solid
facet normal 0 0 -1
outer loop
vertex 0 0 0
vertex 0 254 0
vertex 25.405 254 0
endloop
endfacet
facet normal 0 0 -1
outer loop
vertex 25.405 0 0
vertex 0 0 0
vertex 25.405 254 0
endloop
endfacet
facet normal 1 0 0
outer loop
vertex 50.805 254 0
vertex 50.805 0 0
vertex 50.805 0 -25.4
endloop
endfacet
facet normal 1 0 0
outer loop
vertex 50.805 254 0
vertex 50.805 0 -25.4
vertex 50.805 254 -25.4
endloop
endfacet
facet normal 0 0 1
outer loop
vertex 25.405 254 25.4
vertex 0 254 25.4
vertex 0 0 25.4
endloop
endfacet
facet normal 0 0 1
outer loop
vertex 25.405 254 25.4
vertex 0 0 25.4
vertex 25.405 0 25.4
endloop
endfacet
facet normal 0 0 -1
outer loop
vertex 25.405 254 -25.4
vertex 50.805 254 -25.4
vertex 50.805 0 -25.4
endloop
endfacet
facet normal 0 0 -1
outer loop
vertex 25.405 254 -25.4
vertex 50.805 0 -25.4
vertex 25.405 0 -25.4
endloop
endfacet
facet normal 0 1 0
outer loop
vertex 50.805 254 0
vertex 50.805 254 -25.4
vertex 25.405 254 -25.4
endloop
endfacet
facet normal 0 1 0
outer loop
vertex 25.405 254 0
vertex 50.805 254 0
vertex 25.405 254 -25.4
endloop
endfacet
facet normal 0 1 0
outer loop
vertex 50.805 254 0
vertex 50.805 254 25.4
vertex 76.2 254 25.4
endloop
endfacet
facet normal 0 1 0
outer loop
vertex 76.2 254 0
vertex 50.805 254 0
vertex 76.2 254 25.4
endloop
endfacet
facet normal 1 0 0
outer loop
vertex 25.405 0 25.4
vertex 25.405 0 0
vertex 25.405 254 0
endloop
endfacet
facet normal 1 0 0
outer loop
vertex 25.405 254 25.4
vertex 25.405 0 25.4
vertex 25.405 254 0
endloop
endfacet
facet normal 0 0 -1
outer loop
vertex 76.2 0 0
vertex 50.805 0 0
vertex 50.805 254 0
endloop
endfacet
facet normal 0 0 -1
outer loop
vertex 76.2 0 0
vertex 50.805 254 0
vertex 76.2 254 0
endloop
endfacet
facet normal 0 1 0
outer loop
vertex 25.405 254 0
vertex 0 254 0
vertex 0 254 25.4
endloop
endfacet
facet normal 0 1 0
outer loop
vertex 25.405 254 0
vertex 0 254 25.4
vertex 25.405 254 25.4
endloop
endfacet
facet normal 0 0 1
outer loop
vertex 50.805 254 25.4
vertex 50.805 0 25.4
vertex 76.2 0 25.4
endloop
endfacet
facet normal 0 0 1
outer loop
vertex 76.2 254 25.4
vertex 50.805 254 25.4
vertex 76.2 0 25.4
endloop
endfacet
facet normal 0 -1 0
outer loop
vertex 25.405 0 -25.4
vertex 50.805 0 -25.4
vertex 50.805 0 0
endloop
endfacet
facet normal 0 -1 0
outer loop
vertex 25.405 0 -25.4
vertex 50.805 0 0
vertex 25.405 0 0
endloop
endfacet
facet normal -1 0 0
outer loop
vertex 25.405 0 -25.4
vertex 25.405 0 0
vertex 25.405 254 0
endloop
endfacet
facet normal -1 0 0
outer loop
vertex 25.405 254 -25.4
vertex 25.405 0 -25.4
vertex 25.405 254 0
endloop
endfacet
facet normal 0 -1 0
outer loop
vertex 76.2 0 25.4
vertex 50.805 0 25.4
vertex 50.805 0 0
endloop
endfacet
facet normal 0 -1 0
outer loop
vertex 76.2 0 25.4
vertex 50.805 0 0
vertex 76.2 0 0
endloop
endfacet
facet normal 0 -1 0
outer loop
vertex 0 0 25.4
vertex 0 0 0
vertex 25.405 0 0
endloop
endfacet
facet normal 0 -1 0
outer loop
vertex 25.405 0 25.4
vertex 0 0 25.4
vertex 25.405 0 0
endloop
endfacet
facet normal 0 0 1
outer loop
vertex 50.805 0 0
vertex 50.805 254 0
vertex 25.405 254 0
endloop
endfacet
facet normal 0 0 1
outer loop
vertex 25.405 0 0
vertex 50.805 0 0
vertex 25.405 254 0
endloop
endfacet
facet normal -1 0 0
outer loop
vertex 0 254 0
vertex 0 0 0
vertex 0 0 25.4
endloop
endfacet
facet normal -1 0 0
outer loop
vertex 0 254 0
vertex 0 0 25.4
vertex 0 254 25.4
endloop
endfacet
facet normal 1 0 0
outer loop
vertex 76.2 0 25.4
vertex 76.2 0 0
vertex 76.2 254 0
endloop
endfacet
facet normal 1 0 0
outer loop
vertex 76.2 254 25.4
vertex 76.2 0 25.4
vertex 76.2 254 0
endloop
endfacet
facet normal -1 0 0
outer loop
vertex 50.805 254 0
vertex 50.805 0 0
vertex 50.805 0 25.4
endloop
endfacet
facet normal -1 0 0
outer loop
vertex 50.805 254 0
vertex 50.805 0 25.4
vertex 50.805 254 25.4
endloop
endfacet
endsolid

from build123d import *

# Parameters (mm, degrees)
SKETCH1_W          = 25.395282645
SKETCH1_H          = 254
EXTRUSION2_DEPTH   = 25.4
SKETCH1_W_2        = 25.404717355
EXTRUSION2_2_DEPTH = 25.4
SKETCH2_W          = 25.4
SKETCH2_H          = 254
EXTRUSION3_DEPTH   = 25.4


with BuildPart() as part:
    # Sketch1 → Extrusion2 (new body)
    with BuildSketch(Plane.XY):
        with Locations((63.502358677, 127)):
            Rectangle(SKETCH1_W, SKETCH1_H)
    extrude(amount=EXTRUSION2_DEPTH)


with BuildPart() as body_2:
    # Sketch1 → Extrusion2 2 (new body)
    with BuildSketch(Plane.XY):
        with Locations((12.702358678, 127)):
            Rectangle(SKETCH1_W_2, SKETCH1_H)
    extrude(amount=EXTRUSION2_2_DEPTH)


with BuildPart() as body_3:
    # Sketch2 → Extrusion3 (new body)
    with BuildSketch(Plane(origin=(0, 0, 0), x_dir=(-1, 0, 0), z_dir=(0, 0, -1))):
        with Locations((-38.104717355, 127)):
            Rectangle(SKETCH2_W, SKETCH2_H)
    extrude(amount=EXTRUSION3_DEPTH)


solid = Compound([part.part, body_2.part, body_3.part])
